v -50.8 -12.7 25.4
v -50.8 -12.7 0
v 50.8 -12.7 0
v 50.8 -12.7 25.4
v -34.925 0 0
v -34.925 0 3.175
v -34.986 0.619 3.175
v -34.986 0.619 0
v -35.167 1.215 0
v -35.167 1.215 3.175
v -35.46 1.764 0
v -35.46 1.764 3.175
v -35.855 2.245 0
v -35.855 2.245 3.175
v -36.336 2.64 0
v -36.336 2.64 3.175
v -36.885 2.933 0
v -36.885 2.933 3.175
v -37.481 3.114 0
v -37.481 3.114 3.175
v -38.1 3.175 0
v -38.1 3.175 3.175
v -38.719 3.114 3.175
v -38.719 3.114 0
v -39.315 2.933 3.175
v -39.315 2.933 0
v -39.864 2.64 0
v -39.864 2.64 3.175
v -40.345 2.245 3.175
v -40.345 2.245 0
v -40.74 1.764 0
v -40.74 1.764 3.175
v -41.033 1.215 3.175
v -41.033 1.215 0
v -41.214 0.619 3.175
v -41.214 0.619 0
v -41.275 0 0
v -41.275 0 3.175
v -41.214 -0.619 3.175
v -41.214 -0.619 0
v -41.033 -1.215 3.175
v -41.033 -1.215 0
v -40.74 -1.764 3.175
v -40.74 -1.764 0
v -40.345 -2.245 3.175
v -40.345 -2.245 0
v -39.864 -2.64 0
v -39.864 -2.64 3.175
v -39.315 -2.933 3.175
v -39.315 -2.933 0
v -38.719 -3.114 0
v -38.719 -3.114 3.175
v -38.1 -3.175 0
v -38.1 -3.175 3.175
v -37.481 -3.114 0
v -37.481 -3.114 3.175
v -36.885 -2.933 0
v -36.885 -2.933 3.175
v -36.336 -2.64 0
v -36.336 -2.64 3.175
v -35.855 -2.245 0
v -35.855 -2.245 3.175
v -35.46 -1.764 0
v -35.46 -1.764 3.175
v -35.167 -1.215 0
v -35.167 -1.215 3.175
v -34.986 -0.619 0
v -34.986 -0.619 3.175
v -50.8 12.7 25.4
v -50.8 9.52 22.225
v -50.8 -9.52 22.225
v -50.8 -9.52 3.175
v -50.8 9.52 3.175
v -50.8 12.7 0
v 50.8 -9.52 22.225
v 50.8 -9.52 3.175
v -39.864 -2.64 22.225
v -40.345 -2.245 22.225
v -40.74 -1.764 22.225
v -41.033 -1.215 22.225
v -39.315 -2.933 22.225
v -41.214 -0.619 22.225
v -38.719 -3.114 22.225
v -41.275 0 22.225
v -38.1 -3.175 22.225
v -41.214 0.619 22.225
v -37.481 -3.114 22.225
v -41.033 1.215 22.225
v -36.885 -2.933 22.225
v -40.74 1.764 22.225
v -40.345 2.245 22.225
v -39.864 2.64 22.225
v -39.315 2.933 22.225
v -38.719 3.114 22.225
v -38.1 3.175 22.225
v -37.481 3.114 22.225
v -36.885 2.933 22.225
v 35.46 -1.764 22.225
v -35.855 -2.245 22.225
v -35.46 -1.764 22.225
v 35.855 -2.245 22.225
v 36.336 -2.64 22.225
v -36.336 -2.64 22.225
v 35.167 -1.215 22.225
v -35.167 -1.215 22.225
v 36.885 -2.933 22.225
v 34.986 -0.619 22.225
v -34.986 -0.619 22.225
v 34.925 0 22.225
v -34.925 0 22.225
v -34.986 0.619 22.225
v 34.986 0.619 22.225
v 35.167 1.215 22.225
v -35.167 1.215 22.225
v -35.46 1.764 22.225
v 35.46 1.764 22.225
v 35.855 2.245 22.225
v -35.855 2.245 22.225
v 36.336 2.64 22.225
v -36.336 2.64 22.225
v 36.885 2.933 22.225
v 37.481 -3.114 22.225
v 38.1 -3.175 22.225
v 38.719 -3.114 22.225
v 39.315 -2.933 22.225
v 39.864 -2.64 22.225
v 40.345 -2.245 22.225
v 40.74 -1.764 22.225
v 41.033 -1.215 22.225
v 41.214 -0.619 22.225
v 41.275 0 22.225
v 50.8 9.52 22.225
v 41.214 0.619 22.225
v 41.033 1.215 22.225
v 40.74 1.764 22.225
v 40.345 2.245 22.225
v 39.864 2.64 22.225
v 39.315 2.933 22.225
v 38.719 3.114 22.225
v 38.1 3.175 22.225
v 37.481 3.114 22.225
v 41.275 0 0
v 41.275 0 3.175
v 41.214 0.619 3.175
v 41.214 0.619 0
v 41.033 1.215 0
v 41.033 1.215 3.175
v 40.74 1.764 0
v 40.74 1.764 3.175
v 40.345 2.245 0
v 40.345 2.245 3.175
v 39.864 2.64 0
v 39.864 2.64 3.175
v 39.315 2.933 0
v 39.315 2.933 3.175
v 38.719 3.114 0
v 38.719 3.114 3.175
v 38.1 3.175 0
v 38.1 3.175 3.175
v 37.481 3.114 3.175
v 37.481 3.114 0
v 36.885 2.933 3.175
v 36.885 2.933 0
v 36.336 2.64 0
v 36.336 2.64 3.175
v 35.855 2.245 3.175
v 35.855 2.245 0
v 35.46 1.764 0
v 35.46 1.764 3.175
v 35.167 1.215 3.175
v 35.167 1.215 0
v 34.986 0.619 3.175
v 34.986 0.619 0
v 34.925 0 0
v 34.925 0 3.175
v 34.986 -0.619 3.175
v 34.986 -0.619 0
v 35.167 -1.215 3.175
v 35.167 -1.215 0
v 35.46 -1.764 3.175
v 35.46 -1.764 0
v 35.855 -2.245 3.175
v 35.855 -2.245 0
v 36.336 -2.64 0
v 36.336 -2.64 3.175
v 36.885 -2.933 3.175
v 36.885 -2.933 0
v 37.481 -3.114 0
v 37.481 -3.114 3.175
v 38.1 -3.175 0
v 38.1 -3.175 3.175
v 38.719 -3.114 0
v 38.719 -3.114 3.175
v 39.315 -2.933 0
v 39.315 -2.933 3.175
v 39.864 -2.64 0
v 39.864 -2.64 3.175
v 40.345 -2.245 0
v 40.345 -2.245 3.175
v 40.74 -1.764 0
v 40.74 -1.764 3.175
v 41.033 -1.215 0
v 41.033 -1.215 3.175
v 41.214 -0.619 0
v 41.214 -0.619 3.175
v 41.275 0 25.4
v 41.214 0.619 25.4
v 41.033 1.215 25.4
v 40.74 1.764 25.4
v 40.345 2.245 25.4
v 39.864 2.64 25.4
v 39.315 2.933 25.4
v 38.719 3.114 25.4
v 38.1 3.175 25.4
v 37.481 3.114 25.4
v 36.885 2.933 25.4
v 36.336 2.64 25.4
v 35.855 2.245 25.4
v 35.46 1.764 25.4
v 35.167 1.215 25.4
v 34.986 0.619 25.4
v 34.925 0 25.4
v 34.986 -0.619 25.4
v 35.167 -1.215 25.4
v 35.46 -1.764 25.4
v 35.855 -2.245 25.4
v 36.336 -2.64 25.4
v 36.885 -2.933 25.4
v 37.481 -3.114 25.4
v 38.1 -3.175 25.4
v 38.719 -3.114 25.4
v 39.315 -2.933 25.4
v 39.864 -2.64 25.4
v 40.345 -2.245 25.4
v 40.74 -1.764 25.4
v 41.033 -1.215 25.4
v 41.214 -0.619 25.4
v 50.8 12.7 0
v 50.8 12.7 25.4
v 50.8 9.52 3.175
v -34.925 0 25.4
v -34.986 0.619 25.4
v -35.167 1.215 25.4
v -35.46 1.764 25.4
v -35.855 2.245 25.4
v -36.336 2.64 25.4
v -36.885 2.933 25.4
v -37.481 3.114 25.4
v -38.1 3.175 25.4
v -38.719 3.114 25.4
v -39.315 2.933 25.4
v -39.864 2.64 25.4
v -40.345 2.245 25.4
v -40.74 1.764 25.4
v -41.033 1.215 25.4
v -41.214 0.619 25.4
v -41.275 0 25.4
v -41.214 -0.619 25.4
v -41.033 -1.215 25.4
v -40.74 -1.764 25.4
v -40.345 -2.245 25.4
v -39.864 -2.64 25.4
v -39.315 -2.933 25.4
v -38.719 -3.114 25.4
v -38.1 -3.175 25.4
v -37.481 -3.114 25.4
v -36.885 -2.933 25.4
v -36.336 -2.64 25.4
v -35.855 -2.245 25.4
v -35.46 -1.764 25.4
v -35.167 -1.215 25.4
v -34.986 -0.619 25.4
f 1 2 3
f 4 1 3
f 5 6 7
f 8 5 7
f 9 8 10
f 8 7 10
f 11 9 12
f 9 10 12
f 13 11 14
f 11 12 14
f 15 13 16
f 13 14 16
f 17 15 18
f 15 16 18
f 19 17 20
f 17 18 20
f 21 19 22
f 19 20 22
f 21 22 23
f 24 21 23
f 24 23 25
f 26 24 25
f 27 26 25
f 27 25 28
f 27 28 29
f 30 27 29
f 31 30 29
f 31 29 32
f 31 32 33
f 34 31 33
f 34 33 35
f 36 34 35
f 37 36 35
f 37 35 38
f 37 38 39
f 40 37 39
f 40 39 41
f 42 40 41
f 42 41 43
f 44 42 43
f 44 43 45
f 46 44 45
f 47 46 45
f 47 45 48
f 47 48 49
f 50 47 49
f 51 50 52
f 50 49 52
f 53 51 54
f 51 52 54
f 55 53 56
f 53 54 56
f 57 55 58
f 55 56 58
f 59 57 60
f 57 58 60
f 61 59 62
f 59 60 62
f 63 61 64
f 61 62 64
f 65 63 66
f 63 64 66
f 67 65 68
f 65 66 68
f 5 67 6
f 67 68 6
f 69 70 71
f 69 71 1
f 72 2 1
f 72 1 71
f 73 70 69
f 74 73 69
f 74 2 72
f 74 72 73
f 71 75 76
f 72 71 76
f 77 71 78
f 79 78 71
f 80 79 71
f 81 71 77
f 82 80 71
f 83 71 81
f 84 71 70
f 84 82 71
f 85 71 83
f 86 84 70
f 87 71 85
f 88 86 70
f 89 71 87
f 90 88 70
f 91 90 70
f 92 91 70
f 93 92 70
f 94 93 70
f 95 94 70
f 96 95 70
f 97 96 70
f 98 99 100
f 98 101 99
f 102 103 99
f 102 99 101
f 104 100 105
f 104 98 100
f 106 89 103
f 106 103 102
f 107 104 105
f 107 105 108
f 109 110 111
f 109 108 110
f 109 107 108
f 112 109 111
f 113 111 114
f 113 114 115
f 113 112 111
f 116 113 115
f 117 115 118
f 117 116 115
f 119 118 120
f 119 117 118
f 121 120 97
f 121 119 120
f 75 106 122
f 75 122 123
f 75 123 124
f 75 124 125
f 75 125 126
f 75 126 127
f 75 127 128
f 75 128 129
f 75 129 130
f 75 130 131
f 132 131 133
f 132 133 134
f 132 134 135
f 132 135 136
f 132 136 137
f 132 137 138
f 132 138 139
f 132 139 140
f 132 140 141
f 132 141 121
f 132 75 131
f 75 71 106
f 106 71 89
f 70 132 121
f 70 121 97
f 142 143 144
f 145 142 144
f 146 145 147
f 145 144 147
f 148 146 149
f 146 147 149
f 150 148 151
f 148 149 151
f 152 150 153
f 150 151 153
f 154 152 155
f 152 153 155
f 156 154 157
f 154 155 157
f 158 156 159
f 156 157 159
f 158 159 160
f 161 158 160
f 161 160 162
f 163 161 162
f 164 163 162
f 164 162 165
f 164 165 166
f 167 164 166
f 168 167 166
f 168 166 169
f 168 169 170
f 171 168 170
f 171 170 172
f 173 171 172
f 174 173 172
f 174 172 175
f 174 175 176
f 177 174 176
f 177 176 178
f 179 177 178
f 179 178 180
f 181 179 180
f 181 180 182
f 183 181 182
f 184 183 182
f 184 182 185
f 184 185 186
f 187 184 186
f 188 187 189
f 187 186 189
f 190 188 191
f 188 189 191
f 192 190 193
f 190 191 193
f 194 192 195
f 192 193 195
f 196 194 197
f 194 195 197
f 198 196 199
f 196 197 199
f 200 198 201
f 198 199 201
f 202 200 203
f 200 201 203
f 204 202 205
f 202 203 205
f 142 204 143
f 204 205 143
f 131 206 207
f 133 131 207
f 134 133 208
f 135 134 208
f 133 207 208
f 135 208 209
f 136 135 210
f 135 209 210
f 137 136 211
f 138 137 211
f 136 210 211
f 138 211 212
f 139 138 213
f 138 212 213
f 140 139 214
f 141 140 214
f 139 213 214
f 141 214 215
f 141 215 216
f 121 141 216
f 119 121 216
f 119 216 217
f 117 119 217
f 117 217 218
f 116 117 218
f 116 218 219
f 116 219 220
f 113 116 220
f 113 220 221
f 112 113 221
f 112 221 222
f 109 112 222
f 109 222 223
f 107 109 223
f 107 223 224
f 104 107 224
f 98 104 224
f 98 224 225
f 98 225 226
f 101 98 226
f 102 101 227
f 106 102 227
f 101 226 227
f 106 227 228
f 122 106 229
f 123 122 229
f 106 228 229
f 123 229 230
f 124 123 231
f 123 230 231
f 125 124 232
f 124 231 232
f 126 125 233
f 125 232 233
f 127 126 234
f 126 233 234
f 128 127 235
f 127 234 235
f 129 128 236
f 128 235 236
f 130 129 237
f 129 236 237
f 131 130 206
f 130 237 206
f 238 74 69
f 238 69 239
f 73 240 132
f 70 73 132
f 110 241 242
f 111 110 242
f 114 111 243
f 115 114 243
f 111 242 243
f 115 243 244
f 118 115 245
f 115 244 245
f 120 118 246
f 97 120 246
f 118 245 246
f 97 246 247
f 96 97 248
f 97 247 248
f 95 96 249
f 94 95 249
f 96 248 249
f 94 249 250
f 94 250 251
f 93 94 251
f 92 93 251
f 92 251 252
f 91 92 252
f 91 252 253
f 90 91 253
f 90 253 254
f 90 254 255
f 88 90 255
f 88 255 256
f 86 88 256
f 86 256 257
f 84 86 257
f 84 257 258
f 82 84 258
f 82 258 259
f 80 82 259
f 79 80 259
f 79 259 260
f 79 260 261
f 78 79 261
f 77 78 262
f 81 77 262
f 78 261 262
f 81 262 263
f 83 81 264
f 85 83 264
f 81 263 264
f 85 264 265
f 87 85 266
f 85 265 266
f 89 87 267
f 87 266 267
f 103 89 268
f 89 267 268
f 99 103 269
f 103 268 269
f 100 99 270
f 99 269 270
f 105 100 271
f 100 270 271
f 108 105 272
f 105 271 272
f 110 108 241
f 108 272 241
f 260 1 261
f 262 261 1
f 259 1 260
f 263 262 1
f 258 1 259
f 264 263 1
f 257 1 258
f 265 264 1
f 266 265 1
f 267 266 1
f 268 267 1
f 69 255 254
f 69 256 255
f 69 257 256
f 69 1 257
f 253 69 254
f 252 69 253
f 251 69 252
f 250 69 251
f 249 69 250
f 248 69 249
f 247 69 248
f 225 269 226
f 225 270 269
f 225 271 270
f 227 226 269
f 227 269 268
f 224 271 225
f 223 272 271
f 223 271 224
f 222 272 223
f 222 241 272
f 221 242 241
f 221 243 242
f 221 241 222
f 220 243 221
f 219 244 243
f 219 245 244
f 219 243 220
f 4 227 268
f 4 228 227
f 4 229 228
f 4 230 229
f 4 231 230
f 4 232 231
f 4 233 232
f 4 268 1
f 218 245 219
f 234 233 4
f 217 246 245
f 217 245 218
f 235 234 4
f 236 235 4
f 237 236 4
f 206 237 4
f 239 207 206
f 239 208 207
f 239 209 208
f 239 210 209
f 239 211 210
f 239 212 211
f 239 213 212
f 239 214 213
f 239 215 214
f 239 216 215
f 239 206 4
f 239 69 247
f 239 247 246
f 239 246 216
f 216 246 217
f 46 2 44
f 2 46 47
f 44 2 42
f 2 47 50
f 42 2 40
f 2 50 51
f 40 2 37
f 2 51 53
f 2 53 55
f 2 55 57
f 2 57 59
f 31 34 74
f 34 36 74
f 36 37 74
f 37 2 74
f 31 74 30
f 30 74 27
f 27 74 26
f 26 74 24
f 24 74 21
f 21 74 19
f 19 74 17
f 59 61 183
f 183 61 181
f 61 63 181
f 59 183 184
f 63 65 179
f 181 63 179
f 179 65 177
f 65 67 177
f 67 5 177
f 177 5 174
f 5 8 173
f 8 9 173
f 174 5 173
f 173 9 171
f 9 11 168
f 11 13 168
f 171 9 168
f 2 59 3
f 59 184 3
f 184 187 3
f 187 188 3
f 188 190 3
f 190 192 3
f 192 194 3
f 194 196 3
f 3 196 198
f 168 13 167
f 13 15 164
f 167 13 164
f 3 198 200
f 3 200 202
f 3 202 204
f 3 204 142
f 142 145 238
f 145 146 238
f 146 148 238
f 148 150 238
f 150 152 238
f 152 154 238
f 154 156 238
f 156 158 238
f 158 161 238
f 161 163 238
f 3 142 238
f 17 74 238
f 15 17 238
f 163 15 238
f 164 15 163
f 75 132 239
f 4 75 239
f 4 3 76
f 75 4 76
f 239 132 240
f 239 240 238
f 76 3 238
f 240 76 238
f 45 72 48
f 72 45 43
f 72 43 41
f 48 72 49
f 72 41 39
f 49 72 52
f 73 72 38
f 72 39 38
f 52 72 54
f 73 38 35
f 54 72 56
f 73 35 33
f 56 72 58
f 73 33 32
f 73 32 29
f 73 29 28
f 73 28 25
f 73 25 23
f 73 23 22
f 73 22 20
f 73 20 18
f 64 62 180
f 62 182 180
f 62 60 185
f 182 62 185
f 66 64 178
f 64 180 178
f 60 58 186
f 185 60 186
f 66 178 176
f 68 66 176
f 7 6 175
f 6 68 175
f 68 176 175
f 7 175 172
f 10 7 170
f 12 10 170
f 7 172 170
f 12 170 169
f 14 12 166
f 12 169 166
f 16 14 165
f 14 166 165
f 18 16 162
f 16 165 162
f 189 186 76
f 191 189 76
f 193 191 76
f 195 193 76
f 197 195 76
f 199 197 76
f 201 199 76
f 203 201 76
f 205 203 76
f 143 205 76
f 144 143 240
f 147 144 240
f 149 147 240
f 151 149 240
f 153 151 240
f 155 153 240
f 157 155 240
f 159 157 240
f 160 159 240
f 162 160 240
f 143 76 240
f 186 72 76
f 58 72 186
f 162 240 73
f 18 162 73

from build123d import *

# Parameters (mm, degrees)
SKETCH1_W           = 101.6
SKETCH1_H           = 25.4
BOSS_EXTRUDE1_DEPTH = 25.4
SKETCH2_W           = 9.525
SKETCH2_H           = 19.040717284
CUT_EXTRUDE1_DEPTH  = 508
SKETCH4_R           = 3.175
CUT_EXTRUDE3_DEPTH  = 508


with BuildPart() as part:
    # Sketch1 → Boss-Extrude1 (new body)
    with BuildSketch(Plane.XY):
        Rectangle(SKETCH1_W, SKETCH1_H)
    extrude(amount=BOSS_EXTRUDE1_DEPTH)

    # Sketch2 → Cut-Extrude1 (cut)
    with BuildSketch(Plane(origin=(50.8, 0, 0), x_dir=(0, 0, -1), z_dir=(1, 0, 0))):
        with Locations((-17.4625, 0)):
            Rectangle(SKETCH2_W, SKETCH2_H)
        with Locations((-7.9375, 0)):
            Rectangle(SKETCH2_W, SKETCH2_H)
    extrude(amount=-CUT_EXTRUDE1_DEPTH, mode=Mode.SUBTRACT)

    # Sketch4 → Cut-Extrude3 (cut)
    with BuildSketch(Plane.XY.offset(25.4)):
        with Locations((-38.1, 0)):
            Circle(SKETCH4_R)
        with Locations((38.1, 0)):
            Circle(SKETCH4_R)
    extrude(amount=-CUT_EXTRUDE3_DEPTH, mode=Mode.SUBTRACT)


solid = part.part
